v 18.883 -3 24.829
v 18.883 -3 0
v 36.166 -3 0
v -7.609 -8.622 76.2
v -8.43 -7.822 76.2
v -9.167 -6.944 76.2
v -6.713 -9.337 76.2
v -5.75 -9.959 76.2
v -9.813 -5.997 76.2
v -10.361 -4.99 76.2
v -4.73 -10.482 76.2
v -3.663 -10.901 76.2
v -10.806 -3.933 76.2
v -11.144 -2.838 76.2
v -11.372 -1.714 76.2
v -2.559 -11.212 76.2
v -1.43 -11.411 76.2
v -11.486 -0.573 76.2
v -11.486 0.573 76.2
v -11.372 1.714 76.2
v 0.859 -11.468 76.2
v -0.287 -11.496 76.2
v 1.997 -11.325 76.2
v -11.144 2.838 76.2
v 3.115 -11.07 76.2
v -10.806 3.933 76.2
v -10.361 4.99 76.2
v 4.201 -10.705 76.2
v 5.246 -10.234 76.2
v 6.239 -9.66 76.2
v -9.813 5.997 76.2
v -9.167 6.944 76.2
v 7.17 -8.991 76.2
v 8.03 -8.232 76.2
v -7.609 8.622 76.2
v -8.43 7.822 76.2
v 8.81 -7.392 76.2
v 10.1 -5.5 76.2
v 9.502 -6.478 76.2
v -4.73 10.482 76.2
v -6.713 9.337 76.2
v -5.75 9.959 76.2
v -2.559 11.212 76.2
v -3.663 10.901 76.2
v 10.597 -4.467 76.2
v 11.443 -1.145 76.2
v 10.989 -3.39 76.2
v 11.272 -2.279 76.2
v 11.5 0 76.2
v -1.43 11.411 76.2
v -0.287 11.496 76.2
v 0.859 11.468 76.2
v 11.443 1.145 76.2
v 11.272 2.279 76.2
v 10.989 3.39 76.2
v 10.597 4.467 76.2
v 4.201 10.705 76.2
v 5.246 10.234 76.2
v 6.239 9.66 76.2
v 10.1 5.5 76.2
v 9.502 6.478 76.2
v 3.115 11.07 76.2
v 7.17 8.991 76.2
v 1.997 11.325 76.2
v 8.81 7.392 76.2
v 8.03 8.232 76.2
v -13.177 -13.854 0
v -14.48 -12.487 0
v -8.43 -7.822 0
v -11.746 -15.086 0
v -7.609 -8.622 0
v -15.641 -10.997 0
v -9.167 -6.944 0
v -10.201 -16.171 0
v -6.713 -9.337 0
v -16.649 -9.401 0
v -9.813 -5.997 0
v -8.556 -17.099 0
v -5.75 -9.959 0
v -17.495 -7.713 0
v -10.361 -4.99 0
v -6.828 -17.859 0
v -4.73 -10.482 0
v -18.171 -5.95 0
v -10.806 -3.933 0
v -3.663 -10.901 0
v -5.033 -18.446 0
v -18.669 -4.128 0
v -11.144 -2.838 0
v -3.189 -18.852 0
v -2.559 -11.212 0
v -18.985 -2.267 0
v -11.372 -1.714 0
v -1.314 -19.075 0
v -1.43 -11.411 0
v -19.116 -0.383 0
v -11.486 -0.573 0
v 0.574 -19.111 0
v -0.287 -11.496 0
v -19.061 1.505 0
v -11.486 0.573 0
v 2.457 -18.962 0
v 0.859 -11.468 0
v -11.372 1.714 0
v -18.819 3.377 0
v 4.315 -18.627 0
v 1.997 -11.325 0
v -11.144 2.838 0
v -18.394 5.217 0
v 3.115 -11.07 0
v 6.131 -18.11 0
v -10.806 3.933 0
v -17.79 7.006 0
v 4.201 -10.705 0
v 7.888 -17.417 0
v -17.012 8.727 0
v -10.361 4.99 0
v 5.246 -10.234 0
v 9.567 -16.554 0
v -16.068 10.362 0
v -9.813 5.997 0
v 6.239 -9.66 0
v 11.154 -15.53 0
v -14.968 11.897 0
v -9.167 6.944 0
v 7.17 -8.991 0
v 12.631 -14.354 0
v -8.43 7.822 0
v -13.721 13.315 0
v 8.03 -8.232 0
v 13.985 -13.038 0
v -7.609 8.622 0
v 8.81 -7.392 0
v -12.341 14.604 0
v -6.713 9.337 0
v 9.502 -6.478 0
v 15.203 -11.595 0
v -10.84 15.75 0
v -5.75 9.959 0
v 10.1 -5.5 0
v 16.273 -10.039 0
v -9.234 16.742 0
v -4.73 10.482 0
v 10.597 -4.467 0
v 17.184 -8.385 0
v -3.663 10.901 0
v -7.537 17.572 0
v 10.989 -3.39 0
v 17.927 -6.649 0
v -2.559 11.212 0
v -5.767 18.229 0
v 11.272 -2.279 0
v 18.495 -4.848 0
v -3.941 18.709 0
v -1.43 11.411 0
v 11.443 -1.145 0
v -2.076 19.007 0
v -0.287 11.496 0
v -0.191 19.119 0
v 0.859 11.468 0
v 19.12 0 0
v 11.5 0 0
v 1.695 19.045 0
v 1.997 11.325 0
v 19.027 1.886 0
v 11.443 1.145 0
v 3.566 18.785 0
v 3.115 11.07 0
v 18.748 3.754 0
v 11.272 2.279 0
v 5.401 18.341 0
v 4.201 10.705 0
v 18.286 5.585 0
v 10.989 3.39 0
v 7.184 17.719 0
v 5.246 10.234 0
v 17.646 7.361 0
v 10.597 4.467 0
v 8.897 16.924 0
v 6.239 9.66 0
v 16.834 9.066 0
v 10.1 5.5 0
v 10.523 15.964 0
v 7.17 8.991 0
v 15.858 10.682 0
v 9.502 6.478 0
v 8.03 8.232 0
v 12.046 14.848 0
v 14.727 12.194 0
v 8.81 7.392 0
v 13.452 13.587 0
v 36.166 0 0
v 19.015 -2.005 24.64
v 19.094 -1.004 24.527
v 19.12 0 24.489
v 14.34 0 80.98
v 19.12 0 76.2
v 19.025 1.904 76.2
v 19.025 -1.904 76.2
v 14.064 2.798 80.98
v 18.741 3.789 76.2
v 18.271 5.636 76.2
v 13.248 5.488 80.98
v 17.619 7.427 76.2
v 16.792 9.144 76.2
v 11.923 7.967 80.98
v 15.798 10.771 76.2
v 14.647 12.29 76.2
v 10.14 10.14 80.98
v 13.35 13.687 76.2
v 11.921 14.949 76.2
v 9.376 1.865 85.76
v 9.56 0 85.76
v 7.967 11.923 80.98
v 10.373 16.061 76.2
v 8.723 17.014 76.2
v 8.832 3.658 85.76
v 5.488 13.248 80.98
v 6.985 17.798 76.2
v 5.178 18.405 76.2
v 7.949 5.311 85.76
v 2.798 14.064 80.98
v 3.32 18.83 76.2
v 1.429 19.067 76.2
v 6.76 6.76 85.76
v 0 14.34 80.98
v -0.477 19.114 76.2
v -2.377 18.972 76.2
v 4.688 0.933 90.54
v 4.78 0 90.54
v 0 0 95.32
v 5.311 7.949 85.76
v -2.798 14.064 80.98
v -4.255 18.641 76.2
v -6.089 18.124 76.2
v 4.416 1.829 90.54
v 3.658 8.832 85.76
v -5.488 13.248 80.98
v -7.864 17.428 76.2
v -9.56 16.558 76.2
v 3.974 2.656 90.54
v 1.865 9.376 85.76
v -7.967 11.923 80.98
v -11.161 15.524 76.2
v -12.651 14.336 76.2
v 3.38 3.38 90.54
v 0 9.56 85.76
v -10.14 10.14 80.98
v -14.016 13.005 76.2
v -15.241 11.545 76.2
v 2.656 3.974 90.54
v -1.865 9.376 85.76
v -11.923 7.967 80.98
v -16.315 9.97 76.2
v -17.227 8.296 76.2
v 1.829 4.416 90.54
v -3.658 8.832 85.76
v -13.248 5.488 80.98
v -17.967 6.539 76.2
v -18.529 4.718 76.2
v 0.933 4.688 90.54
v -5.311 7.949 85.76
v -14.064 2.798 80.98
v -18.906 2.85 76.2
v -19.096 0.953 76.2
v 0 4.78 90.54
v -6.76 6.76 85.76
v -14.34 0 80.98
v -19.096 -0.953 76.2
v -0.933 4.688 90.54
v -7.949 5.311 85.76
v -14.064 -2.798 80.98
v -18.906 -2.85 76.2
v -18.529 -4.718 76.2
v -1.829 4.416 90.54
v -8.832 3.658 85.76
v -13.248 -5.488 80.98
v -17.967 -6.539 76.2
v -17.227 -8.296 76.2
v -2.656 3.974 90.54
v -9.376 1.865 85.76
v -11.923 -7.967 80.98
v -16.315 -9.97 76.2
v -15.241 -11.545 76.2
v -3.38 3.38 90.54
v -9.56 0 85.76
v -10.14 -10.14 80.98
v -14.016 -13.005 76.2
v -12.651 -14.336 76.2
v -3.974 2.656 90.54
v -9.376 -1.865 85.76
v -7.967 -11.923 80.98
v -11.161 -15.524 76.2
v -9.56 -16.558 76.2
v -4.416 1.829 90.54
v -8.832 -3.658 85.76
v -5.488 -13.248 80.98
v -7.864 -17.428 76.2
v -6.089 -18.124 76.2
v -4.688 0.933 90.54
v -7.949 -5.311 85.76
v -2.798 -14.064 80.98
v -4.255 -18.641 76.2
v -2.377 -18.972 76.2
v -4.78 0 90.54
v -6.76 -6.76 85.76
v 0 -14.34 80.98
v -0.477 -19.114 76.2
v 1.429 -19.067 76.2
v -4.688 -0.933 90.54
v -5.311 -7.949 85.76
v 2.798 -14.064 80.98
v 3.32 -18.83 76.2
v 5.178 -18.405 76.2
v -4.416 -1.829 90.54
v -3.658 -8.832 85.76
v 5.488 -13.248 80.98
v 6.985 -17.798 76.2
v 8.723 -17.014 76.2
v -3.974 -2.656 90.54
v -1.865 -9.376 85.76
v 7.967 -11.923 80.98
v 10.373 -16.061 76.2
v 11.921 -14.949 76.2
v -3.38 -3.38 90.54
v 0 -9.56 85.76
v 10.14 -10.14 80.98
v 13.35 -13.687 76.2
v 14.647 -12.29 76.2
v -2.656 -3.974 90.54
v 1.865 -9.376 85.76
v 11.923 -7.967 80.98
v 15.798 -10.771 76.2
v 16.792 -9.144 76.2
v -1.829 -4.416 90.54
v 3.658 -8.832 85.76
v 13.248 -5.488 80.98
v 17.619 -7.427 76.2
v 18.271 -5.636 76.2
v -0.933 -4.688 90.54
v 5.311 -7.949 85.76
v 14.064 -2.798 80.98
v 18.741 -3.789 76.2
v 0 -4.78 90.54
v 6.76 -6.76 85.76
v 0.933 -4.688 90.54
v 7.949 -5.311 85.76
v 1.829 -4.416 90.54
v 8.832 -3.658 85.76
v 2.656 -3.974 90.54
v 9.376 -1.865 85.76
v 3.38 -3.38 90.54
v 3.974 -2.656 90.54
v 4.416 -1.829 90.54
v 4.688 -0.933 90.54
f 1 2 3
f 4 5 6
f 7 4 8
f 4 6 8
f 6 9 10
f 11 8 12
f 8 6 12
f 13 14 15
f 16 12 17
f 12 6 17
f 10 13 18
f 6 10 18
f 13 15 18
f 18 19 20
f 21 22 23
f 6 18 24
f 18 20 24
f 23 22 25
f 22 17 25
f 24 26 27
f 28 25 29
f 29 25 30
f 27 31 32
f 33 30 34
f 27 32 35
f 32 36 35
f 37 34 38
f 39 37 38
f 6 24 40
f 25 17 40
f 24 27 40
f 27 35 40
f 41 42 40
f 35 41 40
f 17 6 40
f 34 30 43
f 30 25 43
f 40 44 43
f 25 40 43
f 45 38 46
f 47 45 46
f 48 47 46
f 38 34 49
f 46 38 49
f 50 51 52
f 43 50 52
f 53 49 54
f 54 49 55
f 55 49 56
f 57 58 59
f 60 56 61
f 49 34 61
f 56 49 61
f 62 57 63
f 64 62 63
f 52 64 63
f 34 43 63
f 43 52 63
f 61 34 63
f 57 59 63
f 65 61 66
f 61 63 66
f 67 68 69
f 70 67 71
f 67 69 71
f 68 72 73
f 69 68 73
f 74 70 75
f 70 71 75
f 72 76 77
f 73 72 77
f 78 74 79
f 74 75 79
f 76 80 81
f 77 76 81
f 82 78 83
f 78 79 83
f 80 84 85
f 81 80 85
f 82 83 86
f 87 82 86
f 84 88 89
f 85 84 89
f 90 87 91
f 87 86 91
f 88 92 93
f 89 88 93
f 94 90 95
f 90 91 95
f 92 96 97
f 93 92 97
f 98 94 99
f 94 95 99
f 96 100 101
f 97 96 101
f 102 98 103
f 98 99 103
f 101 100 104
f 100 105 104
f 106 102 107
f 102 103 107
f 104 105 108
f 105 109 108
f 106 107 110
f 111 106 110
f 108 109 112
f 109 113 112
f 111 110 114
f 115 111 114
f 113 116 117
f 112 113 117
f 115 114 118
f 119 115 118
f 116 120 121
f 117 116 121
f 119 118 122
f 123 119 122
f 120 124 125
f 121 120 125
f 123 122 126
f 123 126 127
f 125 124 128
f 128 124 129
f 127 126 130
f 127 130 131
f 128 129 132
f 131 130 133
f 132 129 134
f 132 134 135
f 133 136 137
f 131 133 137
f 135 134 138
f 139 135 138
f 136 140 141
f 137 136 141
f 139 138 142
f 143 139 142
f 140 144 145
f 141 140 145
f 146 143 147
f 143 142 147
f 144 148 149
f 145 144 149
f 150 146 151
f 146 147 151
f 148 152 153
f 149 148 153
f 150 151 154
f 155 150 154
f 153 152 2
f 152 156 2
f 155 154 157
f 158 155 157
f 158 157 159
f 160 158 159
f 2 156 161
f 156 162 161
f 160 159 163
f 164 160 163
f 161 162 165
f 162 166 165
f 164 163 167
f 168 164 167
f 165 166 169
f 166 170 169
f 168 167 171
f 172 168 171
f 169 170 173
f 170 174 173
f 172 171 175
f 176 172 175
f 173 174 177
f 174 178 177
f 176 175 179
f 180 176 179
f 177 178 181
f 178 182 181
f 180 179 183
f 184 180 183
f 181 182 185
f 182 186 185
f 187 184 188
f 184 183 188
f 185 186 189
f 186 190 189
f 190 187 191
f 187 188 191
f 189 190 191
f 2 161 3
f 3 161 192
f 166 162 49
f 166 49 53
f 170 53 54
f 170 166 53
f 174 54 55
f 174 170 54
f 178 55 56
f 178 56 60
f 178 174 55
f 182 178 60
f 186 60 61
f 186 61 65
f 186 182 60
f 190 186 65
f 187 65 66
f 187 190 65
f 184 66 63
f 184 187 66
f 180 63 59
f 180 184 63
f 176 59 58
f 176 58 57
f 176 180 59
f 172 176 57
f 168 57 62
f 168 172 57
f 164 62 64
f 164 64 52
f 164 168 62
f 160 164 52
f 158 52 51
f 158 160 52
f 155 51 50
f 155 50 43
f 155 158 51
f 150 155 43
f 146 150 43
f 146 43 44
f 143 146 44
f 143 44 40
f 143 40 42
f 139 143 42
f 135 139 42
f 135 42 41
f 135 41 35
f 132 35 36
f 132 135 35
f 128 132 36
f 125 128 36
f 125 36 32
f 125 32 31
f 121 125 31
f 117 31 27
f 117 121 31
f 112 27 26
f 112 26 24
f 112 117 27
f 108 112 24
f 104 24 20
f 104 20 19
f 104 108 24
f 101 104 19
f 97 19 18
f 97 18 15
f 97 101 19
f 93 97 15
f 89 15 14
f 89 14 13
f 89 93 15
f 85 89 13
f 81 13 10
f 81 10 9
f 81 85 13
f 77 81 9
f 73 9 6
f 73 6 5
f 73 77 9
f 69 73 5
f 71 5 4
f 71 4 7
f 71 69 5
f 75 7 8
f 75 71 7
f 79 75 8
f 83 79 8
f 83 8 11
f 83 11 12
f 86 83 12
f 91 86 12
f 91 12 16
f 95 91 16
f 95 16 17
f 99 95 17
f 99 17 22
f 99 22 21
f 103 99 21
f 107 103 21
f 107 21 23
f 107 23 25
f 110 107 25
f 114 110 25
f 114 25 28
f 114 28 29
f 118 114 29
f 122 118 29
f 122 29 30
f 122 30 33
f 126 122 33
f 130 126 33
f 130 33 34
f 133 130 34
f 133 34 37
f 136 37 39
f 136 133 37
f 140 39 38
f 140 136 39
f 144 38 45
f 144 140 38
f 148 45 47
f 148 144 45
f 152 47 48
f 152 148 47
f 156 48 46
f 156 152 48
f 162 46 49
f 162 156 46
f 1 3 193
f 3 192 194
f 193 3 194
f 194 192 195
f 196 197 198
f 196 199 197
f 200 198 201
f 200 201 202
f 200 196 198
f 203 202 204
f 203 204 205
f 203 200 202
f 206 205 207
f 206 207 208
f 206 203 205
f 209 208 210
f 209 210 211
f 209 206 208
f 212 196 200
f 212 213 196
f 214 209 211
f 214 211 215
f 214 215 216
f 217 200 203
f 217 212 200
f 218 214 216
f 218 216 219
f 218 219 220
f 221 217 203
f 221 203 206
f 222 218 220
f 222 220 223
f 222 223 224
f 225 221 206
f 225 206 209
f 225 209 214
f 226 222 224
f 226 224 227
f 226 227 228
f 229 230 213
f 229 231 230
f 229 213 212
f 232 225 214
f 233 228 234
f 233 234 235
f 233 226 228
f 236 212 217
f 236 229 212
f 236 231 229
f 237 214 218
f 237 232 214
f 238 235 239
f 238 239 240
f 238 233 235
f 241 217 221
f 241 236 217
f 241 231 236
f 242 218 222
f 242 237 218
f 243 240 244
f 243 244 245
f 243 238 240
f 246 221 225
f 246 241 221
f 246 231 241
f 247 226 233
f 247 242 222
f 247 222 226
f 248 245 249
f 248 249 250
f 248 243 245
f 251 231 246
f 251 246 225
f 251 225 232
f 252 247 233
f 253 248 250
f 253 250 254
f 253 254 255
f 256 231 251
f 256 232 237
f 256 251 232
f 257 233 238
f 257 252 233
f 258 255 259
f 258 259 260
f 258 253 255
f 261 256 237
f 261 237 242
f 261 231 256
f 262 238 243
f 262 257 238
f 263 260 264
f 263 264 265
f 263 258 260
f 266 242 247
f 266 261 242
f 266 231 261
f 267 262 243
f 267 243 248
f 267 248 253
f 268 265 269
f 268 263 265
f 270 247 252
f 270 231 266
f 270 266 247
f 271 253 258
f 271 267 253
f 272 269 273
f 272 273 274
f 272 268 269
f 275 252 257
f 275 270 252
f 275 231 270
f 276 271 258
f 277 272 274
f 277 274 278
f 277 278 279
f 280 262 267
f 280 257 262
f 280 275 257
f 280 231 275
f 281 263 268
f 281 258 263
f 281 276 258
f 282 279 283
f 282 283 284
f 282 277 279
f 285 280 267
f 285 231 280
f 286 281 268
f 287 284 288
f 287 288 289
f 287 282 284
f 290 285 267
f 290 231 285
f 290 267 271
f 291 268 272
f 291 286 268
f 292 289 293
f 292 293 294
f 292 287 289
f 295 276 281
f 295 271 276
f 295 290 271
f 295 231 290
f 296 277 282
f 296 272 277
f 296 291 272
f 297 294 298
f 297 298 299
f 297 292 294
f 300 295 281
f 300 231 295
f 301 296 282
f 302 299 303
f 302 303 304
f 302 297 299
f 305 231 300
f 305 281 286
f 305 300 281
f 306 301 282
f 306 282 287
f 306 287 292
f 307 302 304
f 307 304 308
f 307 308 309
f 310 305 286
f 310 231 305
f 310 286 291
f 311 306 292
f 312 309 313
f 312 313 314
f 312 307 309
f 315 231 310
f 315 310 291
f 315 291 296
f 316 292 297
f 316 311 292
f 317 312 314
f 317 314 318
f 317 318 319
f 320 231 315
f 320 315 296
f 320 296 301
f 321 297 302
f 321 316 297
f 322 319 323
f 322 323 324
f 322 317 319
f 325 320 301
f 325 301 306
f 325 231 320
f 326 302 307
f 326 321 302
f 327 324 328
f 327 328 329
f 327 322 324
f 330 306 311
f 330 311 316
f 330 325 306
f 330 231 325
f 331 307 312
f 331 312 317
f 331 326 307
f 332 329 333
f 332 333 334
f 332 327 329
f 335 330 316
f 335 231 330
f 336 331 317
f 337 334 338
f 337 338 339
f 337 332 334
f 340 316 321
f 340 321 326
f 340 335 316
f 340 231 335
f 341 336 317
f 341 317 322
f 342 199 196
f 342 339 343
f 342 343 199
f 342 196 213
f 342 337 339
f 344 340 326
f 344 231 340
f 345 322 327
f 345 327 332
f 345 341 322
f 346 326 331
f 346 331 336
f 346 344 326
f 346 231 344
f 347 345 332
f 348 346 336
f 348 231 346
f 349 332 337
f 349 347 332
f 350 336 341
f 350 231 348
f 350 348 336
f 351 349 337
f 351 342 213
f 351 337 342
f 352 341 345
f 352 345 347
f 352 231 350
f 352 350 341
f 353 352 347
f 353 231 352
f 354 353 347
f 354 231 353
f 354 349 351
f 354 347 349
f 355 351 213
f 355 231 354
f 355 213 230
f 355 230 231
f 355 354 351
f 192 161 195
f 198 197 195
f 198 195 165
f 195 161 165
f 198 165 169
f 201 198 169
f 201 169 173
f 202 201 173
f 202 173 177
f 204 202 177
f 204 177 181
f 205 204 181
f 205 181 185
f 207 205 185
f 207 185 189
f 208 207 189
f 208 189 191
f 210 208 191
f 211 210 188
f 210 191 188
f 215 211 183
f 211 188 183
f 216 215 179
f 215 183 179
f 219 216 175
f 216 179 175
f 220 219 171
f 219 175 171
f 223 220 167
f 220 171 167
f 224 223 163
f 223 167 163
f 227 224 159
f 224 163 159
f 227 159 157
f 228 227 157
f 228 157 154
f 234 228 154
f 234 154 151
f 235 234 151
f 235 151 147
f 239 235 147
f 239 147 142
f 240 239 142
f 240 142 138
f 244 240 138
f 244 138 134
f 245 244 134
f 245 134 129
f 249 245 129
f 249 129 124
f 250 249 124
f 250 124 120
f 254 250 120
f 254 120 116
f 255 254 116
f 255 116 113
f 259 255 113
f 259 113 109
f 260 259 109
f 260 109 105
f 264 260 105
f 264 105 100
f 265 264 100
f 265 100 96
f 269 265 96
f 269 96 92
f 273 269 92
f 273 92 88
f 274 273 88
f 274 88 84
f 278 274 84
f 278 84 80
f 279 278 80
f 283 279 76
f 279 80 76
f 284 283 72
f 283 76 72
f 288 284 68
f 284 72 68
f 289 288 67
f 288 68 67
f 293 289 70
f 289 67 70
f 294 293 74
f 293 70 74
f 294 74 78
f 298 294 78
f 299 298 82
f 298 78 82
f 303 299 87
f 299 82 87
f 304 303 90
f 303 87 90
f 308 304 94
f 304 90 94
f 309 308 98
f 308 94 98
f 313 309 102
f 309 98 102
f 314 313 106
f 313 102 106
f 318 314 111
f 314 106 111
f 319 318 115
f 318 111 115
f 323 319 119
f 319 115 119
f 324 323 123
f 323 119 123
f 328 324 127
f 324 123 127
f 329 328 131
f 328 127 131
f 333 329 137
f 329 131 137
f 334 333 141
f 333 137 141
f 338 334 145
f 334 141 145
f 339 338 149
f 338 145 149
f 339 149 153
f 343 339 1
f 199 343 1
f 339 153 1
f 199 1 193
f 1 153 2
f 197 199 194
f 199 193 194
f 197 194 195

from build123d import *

# Parameters (mm, degrees)
F0_R     = 19.12
F0_R_2   = 11.5
F1_DEPTH = 76.2
F2_R     = 19.12
F3_DEPTH = 27.94
F3_TAPER = 45
F5_DEPTH = 3


with BuildPart() as f1:
    # F0 (on Top) → F1 (new body)
    with BuildSketch(Plane.XY):
        Circle(F0_R)
        Circle(F0_R_2, mode=Mode.SUBTRACT)
    extrude(amount=F1_DEPTH)

    # F2 (on face) → F3 (join)
    with BuildSketch(Plane.XY.offset(76.2)):
        Circle(F2_R)
    extrude(amount=F3_DEPTH, taper=F3_TAPER)

    # F4 (on Front) → F5 (join)
    with BuildSketch(Plane.XZ):
        Polygon((36.165818572, 0), (17.3498187214, 27.032000944), (16.6167281568, 0), align=None)
    extrude(amount=F5_DEPTH)


solid = f1.part
